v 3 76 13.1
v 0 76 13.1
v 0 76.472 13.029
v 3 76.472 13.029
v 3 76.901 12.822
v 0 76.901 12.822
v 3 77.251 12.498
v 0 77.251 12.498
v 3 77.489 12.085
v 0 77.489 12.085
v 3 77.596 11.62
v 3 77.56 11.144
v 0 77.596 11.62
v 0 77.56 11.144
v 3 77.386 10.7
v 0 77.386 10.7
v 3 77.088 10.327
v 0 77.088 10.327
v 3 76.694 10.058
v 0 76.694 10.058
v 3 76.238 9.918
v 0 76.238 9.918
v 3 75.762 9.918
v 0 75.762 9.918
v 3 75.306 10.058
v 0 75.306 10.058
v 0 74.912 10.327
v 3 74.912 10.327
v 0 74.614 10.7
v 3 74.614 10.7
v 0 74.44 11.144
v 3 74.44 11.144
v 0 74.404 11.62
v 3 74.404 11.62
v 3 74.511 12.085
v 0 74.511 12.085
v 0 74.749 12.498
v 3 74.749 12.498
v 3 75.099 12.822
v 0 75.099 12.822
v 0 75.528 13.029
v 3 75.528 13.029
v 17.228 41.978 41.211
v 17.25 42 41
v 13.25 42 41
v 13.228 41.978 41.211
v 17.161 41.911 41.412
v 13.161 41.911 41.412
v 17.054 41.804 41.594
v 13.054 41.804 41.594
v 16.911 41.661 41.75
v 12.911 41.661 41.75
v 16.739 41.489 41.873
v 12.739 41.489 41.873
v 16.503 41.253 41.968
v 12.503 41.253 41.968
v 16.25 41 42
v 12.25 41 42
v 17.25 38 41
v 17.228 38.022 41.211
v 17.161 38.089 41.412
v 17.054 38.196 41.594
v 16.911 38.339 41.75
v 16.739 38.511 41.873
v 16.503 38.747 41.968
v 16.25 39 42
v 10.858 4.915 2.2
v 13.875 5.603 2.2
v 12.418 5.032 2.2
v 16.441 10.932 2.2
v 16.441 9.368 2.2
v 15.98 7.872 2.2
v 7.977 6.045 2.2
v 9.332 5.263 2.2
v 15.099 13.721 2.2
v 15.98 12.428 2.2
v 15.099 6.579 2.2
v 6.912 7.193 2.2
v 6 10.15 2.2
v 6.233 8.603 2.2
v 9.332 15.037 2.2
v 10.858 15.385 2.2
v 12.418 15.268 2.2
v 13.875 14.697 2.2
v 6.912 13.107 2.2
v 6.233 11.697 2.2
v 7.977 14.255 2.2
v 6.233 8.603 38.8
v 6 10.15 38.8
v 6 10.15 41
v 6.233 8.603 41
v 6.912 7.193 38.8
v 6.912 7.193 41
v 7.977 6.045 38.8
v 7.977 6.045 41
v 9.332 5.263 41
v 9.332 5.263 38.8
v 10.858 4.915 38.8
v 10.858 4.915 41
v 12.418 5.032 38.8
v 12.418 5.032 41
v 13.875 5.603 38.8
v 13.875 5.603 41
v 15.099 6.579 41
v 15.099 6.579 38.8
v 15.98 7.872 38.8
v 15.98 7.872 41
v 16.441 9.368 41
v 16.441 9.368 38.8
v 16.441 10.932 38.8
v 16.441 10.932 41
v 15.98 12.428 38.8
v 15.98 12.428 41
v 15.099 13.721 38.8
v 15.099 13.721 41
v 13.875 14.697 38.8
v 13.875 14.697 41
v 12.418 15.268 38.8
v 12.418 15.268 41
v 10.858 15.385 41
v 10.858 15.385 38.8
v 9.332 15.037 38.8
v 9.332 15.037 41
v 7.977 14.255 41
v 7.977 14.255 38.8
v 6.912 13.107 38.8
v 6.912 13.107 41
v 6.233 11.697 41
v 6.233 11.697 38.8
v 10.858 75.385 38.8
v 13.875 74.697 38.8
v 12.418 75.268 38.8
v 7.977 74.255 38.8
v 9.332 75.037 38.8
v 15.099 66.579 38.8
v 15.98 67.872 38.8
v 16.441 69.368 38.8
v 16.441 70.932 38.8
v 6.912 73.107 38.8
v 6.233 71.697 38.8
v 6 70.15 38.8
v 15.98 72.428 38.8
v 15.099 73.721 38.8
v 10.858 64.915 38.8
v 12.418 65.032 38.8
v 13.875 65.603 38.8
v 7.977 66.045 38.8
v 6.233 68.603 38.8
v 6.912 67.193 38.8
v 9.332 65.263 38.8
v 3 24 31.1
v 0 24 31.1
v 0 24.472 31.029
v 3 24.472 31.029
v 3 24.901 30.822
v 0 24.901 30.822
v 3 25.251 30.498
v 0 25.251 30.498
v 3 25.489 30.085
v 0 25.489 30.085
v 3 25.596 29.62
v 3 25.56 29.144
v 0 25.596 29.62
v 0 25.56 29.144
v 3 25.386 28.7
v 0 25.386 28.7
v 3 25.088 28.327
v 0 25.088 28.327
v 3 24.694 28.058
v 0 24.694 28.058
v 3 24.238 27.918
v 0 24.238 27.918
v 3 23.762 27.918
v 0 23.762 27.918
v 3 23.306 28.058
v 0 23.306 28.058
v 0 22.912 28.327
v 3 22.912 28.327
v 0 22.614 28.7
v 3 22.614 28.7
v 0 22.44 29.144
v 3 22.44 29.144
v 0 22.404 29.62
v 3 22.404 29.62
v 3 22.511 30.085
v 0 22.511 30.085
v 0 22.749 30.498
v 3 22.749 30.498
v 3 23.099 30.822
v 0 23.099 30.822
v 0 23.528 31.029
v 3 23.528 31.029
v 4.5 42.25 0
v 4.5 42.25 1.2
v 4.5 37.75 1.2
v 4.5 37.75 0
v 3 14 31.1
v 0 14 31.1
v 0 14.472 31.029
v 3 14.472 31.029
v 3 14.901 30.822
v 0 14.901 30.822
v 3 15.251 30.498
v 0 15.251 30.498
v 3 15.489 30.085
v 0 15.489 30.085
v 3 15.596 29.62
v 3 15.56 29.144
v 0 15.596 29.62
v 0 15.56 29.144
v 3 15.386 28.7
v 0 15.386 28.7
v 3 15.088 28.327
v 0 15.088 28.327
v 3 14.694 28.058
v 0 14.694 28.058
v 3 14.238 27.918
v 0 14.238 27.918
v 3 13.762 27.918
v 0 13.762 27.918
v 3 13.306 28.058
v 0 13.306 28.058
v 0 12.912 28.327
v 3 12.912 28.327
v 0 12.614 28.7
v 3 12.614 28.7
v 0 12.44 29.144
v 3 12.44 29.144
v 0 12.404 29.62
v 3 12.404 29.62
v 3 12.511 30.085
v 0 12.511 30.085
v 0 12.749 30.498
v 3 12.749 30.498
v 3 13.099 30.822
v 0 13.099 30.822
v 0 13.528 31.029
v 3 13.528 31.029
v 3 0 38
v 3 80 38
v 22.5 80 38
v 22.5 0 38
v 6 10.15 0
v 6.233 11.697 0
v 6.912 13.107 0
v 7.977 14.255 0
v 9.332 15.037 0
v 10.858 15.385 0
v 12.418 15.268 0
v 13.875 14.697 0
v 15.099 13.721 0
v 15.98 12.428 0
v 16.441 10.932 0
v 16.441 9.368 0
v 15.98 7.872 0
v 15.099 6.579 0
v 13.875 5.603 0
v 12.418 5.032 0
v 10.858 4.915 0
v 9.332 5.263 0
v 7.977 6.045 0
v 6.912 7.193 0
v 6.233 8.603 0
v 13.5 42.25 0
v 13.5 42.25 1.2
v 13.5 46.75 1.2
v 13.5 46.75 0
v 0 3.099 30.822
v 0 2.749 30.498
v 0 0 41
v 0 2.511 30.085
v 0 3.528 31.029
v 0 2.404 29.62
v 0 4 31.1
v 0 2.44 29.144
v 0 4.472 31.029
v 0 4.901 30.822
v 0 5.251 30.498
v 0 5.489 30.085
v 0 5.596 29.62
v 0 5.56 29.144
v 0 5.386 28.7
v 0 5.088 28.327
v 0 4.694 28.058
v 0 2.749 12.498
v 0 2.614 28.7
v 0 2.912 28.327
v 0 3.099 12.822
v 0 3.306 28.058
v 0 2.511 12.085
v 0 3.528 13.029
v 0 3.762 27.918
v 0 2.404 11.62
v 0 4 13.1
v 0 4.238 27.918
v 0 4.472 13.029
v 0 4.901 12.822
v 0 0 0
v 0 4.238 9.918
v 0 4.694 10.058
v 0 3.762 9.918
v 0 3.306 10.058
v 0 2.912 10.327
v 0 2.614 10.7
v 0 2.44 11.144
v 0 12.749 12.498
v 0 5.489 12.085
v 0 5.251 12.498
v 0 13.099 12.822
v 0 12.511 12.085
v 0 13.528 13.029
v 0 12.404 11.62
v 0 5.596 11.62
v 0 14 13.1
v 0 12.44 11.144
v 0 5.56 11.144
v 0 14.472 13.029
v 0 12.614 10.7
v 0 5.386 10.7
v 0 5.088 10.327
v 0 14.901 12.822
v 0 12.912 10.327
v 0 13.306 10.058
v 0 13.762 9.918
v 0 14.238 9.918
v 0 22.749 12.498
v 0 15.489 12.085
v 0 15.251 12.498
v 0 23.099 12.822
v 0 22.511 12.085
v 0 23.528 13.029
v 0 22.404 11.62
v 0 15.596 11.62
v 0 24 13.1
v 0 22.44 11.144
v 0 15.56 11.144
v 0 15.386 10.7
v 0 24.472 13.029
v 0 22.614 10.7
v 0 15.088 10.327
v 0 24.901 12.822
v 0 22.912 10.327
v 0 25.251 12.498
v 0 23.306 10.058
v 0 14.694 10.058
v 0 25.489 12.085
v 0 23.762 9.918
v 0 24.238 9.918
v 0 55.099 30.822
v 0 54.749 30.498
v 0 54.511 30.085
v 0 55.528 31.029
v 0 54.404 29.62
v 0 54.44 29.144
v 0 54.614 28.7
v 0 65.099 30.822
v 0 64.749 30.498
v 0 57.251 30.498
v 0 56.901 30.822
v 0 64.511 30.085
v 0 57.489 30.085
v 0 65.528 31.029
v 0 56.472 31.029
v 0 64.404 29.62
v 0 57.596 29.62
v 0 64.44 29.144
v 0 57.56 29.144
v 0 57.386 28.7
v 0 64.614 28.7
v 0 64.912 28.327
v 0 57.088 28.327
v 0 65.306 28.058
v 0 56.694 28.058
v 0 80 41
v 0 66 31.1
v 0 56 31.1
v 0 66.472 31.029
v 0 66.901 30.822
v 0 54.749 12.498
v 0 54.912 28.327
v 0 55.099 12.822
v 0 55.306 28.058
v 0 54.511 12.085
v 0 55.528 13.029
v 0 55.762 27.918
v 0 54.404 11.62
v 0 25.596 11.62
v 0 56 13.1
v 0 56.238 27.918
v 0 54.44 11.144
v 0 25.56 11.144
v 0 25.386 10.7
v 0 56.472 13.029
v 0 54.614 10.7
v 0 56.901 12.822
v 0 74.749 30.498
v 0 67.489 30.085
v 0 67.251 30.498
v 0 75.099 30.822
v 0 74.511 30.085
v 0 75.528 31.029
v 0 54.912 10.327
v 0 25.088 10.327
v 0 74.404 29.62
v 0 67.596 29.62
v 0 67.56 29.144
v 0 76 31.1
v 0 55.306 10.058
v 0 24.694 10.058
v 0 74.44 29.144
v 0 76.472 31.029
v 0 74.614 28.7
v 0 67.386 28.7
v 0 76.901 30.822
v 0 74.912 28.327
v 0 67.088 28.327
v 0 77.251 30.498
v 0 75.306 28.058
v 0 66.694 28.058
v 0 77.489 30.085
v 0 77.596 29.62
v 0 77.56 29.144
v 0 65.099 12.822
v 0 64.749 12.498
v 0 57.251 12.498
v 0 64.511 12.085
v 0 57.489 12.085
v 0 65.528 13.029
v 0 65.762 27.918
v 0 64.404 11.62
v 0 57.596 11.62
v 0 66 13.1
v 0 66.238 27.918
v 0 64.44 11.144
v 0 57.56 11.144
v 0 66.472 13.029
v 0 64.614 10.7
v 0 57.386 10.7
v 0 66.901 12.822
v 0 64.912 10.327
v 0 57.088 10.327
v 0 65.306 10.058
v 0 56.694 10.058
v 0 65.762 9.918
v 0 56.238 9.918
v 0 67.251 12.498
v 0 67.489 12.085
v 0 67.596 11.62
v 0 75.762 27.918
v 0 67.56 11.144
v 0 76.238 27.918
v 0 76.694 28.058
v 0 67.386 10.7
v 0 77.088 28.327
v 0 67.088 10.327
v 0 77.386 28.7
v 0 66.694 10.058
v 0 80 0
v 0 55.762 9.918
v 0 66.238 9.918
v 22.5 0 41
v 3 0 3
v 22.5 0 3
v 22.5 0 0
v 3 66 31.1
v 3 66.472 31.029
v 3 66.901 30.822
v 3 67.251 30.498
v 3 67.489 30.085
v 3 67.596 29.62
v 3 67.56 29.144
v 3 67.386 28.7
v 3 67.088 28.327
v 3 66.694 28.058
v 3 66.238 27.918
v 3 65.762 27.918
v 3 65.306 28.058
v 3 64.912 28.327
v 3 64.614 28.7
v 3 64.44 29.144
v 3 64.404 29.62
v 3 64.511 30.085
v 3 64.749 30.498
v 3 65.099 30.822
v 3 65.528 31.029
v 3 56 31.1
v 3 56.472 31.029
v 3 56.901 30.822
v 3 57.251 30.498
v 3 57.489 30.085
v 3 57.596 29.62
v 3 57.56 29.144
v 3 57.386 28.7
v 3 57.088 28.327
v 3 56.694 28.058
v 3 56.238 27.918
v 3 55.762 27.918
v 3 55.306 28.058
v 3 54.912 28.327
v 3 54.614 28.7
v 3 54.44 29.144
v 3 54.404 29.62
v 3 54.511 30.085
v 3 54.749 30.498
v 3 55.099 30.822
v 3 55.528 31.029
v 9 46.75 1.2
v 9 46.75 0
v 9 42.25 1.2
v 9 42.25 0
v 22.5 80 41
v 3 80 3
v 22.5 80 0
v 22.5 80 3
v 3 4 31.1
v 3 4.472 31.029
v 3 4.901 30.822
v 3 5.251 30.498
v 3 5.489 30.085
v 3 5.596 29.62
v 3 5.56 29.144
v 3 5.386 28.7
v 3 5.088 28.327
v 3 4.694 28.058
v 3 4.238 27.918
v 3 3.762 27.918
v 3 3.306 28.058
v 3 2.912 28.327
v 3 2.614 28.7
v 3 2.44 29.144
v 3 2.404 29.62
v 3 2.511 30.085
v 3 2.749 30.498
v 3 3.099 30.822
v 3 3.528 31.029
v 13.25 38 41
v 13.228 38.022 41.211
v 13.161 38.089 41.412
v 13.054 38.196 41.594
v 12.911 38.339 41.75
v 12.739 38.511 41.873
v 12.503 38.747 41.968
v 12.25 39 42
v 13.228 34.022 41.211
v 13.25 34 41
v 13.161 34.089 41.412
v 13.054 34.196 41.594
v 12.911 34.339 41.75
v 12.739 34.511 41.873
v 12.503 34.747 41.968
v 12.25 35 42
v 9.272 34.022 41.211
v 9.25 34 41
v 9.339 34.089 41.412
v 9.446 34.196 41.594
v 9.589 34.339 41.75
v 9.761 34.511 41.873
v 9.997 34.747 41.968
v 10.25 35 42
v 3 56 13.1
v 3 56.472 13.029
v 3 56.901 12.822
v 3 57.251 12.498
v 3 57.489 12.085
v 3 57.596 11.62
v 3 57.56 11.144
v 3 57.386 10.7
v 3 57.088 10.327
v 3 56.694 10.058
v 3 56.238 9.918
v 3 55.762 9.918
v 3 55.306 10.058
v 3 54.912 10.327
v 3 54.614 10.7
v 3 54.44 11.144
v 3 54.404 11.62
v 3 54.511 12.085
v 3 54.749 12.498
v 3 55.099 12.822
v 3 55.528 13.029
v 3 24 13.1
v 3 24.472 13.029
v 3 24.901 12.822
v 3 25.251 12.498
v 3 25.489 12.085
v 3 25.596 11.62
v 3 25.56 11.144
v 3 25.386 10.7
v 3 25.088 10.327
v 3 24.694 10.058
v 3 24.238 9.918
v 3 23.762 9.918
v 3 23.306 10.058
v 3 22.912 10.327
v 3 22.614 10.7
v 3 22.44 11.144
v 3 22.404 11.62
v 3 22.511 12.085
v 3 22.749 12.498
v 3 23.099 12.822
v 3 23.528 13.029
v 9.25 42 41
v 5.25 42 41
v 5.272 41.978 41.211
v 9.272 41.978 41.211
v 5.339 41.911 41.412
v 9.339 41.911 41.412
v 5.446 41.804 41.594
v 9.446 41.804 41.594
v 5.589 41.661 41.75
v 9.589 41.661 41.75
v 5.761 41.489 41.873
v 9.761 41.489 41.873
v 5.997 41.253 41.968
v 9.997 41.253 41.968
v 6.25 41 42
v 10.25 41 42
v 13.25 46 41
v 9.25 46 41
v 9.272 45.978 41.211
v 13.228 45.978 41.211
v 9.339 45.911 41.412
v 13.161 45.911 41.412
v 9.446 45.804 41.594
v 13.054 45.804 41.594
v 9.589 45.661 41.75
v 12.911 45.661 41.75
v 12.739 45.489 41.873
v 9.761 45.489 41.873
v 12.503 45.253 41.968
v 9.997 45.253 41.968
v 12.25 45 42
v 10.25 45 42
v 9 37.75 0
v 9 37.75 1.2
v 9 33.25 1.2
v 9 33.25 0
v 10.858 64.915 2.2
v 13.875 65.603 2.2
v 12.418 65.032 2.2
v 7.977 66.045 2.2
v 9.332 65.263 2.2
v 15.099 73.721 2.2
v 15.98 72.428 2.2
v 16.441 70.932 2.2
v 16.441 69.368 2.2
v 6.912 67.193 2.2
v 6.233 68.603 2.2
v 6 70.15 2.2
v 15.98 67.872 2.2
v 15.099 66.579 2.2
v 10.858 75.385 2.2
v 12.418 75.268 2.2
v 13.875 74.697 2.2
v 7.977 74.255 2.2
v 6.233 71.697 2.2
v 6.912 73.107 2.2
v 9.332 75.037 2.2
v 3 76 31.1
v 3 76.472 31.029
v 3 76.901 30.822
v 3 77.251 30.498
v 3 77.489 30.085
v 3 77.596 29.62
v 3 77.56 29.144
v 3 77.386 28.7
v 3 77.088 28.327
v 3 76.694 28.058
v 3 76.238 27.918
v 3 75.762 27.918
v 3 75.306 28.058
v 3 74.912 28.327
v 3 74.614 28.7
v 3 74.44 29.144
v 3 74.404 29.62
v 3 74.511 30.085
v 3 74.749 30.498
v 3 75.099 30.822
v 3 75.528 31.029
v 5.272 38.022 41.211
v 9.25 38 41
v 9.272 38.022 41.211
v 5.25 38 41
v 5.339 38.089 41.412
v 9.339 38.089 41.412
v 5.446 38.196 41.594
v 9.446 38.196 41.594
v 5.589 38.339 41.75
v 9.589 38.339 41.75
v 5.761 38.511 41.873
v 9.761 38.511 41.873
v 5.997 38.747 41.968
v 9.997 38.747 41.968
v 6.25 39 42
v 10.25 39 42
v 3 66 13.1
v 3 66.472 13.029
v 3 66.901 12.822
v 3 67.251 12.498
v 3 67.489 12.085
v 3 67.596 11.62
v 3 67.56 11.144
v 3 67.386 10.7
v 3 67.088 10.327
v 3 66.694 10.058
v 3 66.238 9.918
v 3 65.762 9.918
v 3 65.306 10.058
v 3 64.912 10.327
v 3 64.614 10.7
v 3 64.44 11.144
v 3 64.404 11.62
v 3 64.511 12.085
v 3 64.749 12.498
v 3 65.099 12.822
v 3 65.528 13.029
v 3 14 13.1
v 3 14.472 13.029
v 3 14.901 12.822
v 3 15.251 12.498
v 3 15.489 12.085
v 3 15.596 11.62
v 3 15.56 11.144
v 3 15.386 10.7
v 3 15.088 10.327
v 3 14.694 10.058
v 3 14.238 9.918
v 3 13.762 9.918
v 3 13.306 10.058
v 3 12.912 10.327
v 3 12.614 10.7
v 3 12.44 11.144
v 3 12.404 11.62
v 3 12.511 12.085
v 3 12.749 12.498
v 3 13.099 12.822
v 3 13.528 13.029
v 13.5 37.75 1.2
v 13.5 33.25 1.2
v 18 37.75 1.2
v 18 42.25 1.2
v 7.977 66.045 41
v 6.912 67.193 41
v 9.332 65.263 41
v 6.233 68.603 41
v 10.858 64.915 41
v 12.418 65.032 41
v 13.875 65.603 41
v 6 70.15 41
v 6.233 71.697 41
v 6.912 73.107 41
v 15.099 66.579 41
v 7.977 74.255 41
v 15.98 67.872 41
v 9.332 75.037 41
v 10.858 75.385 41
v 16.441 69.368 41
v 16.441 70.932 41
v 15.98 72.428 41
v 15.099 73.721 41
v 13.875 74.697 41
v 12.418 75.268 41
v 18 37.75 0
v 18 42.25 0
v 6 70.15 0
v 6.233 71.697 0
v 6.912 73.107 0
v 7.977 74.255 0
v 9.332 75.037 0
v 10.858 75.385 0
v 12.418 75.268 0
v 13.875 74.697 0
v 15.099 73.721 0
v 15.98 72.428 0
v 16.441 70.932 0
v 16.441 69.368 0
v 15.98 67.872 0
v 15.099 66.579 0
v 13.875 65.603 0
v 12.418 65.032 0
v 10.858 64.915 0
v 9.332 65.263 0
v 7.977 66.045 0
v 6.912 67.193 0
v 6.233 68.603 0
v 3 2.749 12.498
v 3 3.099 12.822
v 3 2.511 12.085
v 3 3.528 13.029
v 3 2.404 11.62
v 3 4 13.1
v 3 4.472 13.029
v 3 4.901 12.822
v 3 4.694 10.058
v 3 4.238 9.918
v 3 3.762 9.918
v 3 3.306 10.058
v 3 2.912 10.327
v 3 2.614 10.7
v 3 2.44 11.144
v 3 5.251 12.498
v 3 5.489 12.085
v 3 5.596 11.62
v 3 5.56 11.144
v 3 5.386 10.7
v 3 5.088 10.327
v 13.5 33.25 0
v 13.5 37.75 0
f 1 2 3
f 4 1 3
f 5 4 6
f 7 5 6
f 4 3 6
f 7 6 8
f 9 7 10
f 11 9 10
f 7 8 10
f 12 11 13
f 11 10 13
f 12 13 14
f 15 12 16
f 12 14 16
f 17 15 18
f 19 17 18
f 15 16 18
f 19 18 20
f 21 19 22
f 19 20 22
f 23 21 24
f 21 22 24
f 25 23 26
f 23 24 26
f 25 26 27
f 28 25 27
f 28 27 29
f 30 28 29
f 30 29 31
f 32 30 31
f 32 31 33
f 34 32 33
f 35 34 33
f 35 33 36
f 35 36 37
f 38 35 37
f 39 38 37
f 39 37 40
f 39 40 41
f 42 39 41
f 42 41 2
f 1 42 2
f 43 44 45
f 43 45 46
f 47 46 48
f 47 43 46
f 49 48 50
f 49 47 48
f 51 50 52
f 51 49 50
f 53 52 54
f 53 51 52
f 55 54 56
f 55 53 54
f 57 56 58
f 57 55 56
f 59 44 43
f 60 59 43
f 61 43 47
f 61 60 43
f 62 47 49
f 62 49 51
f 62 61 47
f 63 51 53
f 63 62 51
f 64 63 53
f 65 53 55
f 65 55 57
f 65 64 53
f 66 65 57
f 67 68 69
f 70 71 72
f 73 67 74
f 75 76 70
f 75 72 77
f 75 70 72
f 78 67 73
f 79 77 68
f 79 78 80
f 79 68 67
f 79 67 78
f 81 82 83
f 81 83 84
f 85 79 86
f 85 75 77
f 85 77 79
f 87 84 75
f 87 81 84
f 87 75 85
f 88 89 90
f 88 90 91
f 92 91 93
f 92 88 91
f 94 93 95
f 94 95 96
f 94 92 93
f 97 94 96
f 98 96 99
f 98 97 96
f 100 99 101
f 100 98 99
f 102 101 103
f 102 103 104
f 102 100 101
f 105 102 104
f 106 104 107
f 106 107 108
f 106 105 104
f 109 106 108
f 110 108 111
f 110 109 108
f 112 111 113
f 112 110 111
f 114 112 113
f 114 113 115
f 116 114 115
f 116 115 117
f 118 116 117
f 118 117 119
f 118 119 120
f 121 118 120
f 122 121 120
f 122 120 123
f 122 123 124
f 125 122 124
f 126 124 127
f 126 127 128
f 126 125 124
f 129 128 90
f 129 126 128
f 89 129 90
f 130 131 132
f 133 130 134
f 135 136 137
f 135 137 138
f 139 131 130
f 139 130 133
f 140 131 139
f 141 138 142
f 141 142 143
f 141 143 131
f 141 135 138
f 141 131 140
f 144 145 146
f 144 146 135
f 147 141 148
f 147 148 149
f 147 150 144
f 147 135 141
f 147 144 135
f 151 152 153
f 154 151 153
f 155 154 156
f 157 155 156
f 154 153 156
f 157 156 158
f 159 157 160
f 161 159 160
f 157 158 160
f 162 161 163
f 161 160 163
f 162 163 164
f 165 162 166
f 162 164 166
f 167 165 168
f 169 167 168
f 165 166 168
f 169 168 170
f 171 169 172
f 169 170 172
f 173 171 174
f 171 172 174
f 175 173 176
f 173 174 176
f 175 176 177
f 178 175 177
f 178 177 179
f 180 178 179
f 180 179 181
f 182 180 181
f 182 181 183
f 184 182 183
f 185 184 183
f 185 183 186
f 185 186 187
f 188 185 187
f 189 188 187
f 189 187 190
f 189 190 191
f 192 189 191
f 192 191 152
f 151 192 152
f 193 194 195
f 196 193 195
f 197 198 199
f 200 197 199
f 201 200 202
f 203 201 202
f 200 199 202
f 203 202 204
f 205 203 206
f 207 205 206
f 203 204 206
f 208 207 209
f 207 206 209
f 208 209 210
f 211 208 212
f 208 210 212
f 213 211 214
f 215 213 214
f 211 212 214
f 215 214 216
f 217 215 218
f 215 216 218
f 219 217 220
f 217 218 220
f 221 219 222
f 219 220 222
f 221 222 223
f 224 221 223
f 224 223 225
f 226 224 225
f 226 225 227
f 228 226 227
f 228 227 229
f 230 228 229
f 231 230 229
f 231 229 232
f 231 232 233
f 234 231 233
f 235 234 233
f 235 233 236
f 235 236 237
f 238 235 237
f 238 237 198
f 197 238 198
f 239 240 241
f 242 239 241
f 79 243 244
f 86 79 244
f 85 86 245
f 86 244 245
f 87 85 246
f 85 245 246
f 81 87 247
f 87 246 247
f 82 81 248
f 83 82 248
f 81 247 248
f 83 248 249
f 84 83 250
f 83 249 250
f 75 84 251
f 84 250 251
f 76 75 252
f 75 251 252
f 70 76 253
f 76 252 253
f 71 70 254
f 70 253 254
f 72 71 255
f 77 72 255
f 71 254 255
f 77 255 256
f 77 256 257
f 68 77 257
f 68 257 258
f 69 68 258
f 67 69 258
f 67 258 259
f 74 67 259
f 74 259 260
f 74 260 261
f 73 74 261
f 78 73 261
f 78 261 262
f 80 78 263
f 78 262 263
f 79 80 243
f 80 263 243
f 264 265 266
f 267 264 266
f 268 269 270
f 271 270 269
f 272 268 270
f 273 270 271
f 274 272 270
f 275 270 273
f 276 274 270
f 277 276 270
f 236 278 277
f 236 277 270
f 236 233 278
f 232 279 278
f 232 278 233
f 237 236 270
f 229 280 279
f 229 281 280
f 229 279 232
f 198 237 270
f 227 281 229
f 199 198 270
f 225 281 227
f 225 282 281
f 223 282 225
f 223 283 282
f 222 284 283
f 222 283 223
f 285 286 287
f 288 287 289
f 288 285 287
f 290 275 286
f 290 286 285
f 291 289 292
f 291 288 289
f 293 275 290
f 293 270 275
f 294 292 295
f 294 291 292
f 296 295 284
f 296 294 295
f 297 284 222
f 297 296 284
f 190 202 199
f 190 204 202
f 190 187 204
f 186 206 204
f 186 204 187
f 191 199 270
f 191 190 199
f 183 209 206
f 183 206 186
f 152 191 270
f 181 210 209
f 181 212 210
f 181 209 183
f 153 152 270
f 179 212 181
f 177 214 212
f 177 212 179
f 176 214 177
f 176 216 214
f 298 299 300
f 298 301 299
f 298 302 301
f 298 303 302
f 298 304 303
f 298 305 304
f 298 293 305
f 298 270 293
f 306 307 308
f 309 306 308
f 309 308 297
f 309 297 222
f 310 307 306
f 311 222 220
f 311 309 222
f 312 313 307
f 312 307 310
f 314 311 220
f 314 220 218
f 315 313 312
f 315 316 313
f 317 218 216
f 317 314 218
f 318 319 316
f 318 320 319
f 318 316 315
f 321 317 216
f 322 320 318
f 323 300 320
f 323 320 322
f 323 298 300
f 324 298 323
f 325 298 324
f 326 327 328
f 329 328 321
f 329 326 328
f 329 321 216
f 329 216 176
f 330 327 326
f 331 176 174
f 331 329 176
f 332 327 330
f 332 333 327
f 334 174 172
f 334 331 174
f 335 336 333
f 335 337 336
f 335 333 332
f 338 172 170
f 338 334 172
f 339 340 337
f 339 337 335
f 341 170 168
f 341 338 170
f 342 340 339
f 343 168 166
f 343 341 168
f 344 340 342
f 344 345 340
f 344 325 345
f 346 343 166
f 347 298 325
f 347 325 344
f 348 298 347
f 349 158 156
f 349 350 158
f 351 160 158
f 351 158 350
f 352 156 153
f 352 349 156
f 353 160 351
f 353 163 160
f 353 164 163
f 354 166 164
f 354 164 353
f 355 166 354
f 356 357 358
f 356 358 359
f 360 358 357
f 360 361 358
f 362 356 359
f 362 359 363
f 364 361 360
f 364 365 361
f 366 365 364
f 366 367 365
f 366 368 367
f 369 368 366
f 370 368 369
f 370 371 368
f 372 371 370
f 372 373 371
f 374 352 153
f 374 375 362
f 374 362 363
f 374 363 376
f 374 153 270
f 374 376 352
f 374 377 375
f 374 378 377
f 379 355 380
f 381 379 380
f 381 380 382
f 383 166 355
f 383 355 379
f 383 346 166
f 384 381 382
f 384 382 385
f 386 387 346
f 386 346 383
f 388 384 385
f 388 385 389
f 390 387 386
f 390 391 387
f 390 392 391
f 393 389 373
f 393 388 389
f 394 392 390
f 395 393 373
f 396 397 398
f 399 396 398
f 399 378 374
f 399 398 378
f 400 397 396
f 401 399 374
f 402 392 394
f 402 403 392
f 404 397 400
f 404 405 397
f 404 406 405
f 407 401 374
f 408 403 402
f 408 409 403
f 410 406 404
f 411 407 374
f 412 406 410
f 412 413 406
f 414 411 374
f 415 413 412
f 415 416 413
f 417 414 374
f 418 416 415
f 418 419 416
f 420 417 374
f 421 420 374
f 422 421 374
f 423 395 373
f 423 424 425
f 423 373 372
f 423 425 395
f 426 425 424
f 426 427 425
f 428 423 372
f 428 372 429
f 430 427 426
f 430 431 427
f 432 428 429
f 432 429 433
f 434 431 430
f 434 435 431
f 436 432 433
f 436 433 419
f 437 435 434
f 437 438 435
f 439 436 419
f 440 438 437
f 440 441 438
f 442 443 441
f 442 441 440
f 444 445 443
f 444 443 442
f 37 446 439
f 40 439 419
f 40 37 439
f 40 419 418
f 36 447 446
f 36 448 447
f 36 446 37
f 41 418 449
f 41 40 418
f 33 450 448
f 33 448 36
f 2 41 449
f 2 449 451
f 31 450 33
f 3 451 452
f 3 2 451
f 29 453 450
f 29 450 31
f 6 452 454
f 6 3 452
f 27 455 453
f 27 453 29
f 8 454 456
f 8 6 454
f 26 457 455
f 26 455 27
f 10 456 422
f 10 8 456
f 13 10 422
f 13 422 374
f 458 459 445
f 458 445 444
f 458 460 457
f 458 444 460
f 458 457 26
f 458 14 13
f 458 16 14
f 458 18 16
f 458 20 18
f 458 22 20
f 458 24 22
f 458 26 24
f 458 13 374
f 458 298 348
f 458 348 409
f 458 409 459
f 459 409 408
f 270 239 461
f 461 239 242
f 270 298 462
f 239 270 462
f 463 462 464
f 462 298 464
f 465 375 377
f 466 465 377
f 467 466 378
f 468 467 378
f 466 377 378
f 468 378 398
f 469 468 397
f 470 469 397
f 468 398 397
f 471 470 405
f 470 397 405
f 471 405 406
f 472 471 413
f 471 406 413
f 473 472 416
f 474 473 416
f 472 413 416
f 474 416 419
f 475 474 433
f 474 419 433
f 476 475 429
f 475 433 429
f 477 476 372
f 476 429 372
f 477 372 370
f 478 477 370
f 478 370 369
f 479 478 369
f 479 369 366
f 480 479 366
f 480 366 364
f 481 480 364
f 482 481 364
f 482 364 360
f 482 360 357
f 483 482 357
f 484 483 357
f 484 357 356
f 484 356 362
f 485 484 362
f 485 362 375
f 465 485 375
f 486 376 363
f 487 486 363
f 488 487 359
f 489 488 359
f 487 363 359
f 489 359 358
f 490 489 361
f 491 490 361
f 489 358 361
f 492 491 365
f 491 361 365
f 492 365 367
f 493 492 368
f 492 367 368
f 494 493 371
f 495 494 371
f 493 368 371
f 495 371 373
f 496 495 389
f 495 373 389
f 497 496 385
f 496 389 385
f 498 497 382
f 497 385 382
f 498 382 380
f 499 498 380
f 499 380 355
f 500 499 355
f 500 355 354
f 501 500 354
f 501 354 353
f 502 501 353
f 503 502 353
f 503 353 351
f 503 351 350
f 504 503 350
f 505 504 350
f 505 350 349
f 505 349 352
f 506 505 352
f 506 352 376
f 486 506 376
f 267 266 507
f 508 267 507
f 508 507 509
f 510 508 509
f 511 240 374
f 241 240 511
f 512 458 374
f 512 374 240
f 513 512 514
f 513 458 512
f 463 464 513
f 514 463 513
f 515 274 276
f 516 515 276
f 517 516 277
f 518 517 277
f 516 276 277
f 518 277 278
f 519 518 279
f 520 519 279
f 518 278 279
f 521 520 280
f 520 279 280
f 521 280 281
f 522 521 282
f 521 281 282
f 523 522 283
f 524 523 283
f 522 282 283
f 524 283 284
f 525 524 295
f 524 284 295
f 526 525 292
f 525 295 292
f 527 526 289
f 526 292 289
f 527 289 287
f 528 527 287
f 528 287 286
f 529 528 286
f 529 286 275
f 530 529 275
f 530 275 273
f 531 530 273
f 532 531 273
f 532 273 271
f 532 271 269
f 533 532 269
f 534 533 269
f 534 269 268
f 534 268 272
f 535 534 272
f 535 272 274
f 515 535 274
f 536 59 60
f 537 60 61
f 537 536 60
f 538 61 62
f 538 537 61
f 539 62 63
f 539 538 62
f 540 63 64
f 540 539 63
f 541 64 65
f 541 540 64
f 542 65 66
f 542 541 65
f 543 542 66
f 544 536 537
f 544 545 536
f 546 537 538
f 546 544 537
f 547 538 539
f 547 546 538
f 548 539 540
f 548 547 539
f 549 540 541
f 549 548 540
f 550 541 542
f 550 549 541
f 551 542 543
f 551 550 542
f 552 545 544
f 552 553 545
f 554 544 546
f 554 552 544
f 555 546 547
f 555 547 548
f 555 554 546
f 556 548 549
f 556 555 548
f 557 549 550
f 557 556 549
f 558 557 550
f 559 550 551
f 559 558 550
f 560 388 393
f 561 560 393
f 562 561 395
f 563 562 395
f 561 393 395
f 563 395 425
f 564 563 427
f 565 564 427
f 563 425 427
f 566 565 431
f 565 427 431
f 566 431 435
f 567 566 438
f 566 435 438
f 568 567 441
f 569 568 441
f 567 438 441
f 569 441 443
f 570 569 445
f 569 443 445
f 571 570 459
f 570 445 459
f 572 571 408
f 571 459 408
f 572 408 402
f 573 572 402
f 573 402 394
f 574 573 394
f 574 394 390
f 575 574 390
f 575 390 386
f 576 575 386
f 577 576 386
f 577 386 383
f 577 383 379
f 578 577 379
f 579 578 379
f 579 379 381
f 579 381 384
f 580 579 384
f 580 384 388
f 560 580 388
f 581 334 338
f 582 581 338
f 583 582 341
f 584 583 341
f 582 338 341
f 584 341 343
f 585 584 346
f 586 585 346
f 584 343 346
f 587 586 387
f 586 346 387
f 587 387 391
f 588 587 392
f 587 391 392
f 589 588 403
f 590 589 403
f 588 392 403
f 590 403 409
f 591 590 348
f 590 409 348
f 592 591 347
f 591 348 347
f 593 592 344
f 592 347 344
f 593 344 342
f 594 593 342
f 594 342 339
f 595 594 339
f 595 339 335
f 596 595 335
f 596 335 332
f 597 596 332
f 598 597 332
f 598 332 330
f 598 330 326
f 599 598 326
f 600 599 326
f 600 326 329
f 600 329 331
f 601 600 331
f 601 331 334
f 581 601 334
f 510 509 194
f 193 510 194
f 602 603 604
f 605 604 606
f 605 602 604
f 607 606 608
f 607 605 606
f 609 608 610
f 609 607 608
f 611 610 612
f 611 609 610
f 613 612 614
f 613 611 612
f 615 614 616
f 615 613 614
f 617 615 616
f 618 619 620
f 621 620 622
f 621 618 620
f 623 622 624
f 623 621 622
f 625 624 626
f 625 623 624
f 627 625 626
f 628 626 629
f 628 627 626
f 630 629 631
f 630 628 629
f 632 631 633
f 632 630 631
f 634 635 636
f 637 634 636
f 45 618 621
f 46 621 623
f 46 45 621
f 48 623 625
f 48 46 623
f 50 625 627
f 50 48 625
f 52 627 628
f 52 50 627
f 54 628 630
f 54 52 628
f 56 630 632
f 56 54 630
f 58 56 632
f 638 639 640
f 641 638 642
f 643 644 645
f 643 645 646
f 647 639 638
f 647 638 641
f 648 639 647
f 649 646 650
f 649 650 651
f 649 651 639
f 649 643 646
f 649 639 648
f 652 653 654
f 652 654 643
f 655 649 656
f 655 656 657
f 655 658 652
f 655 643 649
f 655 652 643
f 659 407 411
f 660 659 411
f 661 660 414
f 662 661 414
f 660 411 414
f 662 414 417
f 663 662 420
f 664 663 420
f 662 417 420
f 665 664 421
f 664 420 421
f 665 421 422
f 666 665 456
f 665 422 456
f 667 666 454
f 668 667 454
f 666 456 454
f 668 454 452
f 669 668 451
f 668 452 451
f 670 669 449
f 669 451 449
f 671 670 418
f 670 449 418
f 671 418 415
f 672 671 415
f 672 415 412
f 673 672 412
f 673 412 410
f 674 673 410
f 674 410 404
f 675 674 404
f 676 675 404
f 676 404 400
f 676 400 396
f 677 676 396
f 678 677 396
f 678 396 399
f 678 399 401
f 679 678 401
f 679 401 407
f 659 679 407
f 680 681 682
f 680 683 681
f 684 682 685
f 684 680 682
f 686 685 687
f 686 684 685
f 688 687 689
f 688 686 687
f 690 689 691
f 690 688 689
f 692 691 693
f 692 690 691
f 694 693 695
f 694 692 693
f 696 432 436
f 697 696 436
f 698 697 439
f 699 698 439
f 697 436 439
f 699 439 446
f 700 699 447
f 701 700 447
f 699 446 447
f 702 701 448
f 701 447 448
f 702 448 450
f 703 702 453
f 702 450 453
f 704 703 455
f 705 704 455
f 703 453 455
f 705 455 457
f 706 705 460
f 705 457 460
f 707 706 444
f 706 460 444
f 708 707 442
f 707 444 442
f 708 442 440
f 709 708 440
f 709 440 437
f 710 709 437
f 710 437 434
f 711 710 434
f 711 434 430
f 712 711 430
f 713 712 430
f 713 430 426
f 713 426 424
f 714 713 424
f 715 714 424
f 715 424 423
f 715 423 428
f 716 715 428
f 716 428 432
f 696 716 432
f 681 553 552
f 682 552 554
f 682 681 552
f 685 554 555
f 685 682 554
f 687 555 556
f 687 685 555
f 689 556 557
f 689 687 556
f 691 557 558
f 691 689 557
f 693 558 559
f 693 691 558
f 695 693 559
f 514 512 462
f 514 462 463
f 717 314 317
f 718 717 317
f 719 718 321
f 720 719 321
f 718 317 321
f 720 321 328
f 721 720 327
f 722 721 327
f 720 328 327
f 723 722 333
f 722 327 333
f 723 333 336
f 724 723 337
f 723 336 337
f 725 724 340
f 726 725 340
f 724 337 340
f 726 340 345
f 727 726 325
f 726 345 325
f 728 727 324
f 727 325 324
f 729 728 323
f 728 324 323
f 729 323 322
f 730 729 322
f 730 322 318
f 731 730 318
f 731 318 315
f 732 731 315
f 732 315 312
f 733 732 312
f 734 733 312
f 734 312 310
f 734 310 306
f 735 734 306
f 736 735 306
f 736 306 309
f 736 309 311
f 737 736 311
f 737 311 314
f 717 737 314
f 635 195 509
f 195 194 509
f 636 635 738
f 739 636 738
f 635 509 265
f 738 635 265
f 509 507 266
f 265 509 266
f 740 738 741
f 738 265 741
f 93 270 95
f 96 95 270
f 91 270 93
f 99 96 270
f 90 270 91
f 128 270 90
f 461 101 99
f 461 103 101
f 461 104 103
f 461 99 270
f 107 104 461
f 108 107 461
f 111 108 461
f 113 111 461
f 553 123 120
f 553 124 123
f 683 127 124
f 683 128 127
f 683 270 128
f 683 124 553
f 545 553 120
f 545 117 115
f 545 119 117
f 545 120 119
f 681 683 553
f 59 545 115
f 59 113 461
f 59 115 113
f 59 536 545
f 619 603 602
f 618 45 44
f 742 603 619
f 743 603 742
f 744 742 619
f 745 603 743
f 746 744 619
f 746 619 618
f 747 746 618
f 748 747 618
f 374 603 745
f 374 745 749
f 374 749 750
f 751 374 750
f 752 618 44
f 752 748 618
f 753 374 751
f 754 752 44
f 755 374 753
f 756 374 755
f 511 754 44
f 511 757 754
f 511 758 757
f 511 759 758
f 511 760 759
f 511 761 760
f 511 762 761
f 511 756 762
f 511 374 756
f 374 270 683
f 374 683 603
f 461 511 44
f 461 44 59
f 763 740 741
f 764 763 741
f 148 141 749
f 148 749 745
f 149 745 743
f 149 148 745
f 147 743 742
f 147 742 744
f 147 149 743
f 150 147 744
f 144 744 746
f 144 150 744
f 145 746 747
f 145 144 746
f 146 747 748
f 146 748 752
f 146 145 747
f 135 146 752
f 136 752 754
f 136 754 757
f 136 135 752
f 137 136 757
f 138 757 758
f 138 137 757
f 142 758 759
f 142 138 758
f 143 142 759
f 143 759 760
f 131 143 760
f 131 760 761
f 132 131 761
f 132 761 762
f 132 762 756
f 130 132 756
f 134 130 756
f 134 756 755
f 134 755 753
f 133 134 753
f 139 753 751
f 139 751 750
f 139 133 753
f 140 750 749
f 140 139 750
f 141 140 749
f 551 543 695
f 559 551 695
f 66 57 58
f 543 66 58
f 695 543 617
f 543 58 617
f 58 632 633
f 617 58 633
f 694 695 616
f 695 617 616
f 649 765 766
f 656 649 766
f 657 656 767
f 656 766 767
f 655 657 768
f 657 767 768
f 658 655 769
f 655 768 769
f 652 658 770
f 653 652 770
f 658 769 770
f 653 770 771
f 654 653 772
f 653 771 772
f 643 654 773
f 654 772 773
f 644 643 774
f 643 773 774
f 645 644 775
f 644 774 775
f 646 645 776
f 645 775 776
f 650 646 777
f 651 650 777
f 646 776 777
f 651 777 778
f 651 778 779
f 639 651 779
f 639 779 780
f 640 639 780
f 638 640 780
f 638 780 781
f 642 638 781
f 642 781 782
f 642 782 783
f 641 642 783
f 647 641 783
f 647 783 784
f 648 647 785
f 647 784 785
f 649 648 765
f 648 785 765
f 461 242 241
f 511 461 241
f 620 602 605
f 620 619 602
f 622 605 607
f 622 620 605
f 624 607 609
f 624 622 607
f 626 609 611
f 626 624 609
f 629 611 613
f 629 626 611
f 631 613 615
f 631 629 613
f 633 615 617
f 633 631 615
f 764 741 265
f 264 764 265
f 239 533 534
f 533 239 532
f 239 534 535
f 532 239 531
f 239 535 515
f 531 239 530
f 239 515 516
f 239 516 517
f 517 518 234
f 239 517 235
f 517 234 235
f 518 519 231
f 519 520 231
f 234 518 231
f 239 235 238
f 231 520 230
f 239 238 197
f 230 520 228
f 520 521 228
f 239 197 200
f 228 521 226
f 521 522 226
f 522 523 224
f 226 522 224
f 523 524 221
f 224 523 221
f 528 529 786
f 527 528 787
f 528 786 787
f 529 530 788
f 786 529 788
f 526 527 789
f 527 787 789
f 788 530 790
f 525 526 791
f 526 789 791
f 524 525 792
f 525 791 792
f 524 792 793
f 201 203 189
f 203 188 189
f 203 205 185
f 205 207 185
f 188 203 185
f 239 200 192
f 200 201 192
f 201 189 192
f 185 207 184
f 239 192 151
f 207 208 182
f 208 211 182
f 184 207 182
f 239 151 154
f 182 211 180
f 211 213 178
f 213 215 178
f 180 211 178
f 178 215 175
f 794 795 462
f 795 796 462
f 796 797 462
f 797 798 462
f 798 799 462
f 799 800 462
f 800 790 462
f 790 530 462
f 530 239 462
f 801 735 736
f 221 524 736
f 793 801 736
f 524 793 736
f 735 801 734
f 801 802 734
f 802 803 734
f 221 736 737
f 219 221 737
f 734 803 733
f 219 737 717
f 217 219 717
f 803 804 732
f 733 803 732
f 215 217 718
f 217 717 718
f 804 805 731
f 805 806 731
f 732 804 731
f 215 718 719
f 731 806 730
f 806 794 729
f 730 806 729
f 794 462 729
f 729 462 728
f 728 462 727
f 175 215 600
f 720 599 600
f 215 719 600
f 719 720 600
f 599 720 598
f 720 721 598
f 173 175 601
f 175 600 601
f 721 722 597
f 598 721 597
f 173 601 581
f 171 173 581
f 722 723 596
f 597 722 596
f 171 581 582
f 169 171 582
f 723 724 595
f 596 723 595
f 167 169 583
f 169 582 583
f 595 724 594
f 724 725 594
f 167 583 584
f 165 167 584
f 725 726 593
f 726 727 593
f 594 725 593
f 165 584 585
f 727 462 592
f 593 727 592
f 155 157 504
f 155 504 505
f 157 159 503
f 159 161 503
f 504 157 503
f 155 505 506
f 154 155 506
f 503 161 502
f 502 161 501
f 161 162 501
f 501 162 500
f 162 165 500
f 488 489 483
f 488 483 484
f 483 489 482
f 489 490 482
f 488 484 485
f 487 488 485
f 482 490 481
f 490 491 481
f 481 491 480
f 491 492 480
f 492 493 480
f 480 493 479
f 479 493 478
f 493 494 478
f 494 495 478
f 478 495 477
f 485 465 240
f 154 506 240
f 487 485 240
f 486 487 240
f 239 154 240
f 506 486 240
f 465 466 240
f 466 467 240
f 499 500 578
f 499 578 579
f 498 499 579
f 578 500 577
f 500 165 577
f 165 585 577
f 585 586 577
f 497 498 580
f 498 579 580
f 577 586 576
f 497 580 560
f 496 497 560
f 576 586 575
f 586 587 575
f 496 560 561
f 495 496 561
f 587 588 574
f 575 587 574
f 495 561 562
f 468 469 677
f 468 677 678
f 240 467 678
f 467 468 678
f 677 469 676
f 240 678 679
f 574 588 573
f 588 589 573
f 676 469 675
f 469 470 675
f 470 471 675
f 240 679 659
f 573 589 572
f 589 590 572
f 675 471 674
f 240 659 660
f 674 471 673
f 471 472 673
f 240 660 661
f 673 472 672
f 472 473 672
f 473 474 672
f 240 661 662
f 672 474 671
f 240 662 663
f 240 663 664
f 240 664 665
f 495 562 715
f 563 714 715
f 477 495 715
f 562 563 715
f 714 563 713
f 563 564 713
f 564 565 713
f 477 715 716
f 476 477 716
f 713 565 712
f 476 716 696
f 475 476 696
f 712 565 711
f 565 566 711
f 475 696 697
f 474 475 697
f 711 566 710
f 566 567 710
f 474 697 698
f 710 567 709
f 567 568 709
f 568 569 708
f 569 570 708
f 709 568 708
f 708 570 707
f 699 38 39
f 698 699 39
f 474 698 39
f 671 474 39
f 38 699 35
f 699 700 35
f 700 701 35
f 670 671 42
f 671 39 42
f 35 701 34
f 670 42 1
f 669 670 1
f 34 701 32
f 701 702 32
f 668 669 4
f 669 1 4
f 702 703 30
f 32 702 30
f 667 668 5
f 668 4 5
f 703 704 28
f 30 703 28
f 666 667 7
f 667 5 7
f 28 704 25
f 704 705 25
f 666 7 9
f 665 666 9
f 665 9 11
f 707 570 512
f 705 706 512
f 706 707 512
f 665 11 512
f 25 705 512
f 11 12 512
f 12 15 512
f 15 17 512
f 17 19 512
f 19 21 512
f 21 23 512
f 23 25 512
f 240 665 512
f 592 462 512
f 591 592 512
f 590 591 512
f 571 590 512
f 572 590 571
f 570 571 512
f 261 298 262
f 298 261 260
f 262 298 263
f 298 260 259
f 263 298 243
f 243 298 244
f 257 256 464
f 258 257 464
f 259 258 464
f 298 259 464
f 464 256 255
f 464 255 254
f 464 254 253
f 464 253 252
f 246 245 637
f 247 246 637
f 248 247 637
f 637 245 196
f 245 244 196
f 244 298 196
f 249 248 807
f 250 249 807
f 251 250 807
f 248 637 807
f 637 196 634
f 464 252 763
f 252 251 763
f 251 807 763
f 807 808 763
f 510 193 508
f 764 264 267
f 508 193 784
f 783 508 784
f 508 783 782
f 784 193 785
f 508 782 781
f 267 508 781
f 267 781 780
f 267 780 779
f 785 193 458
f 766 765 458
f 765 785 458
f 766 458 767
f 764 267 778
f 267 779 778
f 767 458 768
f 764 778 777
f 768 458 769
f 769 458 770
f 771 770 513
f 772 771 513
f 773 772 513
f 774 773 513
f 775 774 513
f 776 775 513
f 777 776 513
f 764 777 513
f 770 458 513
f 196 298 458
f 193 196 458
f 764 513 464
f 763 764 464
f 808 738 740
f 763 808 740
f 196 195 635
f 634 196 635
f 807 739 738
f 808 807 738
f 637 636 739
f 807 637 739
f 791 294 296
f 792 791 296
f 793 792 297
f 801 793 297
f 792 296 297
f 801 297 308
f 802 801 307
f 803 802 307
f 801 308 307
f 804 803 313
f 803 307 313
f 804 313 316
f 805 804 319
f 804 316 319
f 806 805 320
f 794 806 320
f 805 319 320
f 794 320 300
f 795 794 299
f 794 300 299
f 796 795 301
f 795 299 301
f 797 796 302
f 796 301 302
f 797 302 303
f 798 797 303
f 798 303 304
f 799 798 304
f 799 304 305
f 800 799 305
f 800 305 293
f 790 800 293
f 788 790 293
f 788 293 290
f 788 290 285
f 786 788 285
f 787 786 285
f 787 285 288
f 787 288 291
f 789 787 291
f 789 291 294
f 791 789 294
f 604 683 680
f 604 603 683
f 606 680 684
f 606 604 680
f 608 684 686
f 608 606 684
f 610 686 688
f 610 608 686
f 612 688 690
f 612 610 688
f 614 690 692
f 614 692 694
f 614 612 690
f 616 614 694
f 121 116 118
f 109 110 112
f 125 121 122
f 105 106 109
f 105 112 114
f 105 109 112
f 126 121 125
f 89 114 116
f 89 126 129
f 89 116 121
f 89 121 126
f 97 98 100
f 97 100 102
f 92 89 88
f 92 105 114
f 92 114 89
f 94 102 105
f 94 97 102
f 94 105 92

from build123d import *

# Parameters (mm, degrees)
ESQUISSE1_W             = 22.5
ESQUISSE1_H             = 80
BOSS_EXTRU_1_DEPTH      = 3
ESQUISSE2_W             = 3
ESQUISSE2_H             = 80
BOSS_EXTRU_2_DEPTH      = 35
ESQUISSE3_W             = 22.5
ESQUISSE3_H             = 80
BOSS_EXTRU_3_DEPTH      = 3
ESQUISSE4_R             = 5.25
ENL_V_MAT_EXTRU_1_DEPTH = 2.2
ENL_V_START             = -1.8
ENL_V_MAT_EXTRU_2_DEPTH = 1.2
ENL_V_START_2           = -2.2
ESQUISSE6_R             = 5.25
ENL_V_MAT_EXTRU_3_DEPTH = 2.2
BOSS_EXTRU_4_DEPTH      = 1
ESQUISSE8_R             = 1.6
ENL_V_MAT_EXTRU_4_DEPTH = 4
CONG_2_R                = 1


with BuildPart() as part:
    # Esquisse1 → Boss.-Extru.1 (new body)
    with BuildSketch(Plane.XY):
        with Locations((11.25, 40)):
            Rectangle(ESQUISSE1_W, ESQUISSE1_H)
    extrude(amount=BOSS_EXTRU_1_DEPTH)

    # Esquisse2 → Boss.-Extru.2 (add)
    with BuildSketch(Plane.XY.offset(3)):
        with Locations((1.5, 40)):
            Rectangle(ESQUISSE2_W, ESQUISSE2_H)
    extrude(amount=BOSS_EXTRU_2_DEPTH)

    # Esquisse3 → Boss.-Extru.3 (add)
    with BuildSketch(Plane.XY.offset(38)):
        with Locations((11.25, 40)):
            Rectangle(ESQUISSE3_W, ESQUISSE3_H)
    extrude(amount=BOSS_EXTRU_3_DEPTH)

    # Esquisse4 → Enlèv. mat.-Extru.1 (cut)
    with BuildSketch(Plane(origin=(0, 0, 0), x_dir=(-1, 0, 0), z_dir=(0, 0, -1))):
        with Locations((-11.25, 10.15)):
            Circle(ESQUISSE4_R)
        with Locations((-11.25, 70.15)):
            Circle(ESQUISSE4_R)
    extrude(amount=-ENL_V_MAT_EXTRU_1_DEPTH, mode=Mode.SUBTRACT)

    # Esquisse5 → Enlèv. mat.-Extru.2 (cut)
    with BuildSketch(Plane.XY.offset(3).offset(ENL_V_START)):
        Polygon((4.5, 37.75), (9, 37.75), (9, 33.25), (13.5, 33.25), (13.5, 37.75), (18, 37.75), (18, 42.25), (13.5, 42.25), (13.5, 46.75), (9, 46.75), (9, 42.25), (4.5, 42.25), align=None)
    extrude(amount=-ENL_V_MAT_EXTRU_2_DEPTH, mode=Mode.SUBTRACT)

    # Esquisse6 → Enlèv. mat.-Extru.3 (cut)
    with BuildSketch(Plane.XY.offset(41).offset(ENL_V_START_2)):
        with Locations(Location((11.25, 10.15, 0), (0, 0, 180))):
            Circle(ESQUISSE6_R)
        with Locations(Location((11.25, 70.15, 0), (0, 0, 180))):
            Circle(ESQUISSE6_R)
    extrude(amount=ENL_V_MAT_EXTRU_3_DEPTH, mode=Mode.SUBTRACT)

    # Esquisse7 → Boss.-Extru.4 (add)
    with BuildSketch(Plane.XY.offset(41)):
        Polygon((5.25, 42), (9.25, 42), (9.25, 46), (13.25, 46), (13.25, 42), (17.25, 42), (17.25, 38), (13.25, 38), (13.25, 34), (9.25, 34), (9.25, 38), (5.25, 38), align=None)
    extrude(amount=BOSS_EXTRU_4_DEPTH)

    # Esquisse8 → Enlèv. mat.-Extru.4 (cut)
    with BuildSketch(Plane.ZY):
        with Locations((29.5, 76)):
            Circle(ESQUISSE8_R)
        with Locations((29.5, 66)):
            Circle(ESQUISSE8_R)
        with Locations((29.5, 56)):
            Circle(ESQUISSE8_R)
        with Locations((11.5, 76)):
            Circle(ESQUISSE8_R)
        with Locations((11.5, 66)):
            Circle(ESQUISSE8_R)
        with Locations((11.5, 56)):
            Circle(ESQUISSE8_R)
        with Locations((11.5, 4)):
            Circle(ESQUISSE8_R)
        with Locations((11.5, 14)):
            Circle(ESQUISSE8_R)
        with Locations((11.5, 24)):
            Circle(ESQUISSE8_R)
        with Locations((29.5, 24)):
            Circle(ESQUISSE8_R)
        with Locations((29.5, 14)):
            Circle(ESQUISSE8_R)
        with Locations((29.5, 4)):
            Circle(ESQUISSE8_R)
    extrude(amount=-ENL_V_MAT_EXTRU_4_DEPTH, mode=Mode.SUBTRACT)

    # Congé2
    cong_2_edges = [part.edges().sort_by_distance(p)[0] for p in [
        (11.25, 46, 42),
        (9.25, 44, 42),
        (13.25, 44, 42),
        (15.25, 42, 42),
        (17.25, 40, 42),
        (15.25, 38, 42),
        (13.25, 36, 42),
        (9.25, 36, 42),
        (7.25, 38, 42),
        (7.25, 42, 42),
        (5.25, 40, 42),
        (11.25, 34, 42),
    ]]
    fillet(cong_2_edges, radius=CONG_2_R - 0.0001)  # a hair under: the kernel refuses the full size


solid = part.part
